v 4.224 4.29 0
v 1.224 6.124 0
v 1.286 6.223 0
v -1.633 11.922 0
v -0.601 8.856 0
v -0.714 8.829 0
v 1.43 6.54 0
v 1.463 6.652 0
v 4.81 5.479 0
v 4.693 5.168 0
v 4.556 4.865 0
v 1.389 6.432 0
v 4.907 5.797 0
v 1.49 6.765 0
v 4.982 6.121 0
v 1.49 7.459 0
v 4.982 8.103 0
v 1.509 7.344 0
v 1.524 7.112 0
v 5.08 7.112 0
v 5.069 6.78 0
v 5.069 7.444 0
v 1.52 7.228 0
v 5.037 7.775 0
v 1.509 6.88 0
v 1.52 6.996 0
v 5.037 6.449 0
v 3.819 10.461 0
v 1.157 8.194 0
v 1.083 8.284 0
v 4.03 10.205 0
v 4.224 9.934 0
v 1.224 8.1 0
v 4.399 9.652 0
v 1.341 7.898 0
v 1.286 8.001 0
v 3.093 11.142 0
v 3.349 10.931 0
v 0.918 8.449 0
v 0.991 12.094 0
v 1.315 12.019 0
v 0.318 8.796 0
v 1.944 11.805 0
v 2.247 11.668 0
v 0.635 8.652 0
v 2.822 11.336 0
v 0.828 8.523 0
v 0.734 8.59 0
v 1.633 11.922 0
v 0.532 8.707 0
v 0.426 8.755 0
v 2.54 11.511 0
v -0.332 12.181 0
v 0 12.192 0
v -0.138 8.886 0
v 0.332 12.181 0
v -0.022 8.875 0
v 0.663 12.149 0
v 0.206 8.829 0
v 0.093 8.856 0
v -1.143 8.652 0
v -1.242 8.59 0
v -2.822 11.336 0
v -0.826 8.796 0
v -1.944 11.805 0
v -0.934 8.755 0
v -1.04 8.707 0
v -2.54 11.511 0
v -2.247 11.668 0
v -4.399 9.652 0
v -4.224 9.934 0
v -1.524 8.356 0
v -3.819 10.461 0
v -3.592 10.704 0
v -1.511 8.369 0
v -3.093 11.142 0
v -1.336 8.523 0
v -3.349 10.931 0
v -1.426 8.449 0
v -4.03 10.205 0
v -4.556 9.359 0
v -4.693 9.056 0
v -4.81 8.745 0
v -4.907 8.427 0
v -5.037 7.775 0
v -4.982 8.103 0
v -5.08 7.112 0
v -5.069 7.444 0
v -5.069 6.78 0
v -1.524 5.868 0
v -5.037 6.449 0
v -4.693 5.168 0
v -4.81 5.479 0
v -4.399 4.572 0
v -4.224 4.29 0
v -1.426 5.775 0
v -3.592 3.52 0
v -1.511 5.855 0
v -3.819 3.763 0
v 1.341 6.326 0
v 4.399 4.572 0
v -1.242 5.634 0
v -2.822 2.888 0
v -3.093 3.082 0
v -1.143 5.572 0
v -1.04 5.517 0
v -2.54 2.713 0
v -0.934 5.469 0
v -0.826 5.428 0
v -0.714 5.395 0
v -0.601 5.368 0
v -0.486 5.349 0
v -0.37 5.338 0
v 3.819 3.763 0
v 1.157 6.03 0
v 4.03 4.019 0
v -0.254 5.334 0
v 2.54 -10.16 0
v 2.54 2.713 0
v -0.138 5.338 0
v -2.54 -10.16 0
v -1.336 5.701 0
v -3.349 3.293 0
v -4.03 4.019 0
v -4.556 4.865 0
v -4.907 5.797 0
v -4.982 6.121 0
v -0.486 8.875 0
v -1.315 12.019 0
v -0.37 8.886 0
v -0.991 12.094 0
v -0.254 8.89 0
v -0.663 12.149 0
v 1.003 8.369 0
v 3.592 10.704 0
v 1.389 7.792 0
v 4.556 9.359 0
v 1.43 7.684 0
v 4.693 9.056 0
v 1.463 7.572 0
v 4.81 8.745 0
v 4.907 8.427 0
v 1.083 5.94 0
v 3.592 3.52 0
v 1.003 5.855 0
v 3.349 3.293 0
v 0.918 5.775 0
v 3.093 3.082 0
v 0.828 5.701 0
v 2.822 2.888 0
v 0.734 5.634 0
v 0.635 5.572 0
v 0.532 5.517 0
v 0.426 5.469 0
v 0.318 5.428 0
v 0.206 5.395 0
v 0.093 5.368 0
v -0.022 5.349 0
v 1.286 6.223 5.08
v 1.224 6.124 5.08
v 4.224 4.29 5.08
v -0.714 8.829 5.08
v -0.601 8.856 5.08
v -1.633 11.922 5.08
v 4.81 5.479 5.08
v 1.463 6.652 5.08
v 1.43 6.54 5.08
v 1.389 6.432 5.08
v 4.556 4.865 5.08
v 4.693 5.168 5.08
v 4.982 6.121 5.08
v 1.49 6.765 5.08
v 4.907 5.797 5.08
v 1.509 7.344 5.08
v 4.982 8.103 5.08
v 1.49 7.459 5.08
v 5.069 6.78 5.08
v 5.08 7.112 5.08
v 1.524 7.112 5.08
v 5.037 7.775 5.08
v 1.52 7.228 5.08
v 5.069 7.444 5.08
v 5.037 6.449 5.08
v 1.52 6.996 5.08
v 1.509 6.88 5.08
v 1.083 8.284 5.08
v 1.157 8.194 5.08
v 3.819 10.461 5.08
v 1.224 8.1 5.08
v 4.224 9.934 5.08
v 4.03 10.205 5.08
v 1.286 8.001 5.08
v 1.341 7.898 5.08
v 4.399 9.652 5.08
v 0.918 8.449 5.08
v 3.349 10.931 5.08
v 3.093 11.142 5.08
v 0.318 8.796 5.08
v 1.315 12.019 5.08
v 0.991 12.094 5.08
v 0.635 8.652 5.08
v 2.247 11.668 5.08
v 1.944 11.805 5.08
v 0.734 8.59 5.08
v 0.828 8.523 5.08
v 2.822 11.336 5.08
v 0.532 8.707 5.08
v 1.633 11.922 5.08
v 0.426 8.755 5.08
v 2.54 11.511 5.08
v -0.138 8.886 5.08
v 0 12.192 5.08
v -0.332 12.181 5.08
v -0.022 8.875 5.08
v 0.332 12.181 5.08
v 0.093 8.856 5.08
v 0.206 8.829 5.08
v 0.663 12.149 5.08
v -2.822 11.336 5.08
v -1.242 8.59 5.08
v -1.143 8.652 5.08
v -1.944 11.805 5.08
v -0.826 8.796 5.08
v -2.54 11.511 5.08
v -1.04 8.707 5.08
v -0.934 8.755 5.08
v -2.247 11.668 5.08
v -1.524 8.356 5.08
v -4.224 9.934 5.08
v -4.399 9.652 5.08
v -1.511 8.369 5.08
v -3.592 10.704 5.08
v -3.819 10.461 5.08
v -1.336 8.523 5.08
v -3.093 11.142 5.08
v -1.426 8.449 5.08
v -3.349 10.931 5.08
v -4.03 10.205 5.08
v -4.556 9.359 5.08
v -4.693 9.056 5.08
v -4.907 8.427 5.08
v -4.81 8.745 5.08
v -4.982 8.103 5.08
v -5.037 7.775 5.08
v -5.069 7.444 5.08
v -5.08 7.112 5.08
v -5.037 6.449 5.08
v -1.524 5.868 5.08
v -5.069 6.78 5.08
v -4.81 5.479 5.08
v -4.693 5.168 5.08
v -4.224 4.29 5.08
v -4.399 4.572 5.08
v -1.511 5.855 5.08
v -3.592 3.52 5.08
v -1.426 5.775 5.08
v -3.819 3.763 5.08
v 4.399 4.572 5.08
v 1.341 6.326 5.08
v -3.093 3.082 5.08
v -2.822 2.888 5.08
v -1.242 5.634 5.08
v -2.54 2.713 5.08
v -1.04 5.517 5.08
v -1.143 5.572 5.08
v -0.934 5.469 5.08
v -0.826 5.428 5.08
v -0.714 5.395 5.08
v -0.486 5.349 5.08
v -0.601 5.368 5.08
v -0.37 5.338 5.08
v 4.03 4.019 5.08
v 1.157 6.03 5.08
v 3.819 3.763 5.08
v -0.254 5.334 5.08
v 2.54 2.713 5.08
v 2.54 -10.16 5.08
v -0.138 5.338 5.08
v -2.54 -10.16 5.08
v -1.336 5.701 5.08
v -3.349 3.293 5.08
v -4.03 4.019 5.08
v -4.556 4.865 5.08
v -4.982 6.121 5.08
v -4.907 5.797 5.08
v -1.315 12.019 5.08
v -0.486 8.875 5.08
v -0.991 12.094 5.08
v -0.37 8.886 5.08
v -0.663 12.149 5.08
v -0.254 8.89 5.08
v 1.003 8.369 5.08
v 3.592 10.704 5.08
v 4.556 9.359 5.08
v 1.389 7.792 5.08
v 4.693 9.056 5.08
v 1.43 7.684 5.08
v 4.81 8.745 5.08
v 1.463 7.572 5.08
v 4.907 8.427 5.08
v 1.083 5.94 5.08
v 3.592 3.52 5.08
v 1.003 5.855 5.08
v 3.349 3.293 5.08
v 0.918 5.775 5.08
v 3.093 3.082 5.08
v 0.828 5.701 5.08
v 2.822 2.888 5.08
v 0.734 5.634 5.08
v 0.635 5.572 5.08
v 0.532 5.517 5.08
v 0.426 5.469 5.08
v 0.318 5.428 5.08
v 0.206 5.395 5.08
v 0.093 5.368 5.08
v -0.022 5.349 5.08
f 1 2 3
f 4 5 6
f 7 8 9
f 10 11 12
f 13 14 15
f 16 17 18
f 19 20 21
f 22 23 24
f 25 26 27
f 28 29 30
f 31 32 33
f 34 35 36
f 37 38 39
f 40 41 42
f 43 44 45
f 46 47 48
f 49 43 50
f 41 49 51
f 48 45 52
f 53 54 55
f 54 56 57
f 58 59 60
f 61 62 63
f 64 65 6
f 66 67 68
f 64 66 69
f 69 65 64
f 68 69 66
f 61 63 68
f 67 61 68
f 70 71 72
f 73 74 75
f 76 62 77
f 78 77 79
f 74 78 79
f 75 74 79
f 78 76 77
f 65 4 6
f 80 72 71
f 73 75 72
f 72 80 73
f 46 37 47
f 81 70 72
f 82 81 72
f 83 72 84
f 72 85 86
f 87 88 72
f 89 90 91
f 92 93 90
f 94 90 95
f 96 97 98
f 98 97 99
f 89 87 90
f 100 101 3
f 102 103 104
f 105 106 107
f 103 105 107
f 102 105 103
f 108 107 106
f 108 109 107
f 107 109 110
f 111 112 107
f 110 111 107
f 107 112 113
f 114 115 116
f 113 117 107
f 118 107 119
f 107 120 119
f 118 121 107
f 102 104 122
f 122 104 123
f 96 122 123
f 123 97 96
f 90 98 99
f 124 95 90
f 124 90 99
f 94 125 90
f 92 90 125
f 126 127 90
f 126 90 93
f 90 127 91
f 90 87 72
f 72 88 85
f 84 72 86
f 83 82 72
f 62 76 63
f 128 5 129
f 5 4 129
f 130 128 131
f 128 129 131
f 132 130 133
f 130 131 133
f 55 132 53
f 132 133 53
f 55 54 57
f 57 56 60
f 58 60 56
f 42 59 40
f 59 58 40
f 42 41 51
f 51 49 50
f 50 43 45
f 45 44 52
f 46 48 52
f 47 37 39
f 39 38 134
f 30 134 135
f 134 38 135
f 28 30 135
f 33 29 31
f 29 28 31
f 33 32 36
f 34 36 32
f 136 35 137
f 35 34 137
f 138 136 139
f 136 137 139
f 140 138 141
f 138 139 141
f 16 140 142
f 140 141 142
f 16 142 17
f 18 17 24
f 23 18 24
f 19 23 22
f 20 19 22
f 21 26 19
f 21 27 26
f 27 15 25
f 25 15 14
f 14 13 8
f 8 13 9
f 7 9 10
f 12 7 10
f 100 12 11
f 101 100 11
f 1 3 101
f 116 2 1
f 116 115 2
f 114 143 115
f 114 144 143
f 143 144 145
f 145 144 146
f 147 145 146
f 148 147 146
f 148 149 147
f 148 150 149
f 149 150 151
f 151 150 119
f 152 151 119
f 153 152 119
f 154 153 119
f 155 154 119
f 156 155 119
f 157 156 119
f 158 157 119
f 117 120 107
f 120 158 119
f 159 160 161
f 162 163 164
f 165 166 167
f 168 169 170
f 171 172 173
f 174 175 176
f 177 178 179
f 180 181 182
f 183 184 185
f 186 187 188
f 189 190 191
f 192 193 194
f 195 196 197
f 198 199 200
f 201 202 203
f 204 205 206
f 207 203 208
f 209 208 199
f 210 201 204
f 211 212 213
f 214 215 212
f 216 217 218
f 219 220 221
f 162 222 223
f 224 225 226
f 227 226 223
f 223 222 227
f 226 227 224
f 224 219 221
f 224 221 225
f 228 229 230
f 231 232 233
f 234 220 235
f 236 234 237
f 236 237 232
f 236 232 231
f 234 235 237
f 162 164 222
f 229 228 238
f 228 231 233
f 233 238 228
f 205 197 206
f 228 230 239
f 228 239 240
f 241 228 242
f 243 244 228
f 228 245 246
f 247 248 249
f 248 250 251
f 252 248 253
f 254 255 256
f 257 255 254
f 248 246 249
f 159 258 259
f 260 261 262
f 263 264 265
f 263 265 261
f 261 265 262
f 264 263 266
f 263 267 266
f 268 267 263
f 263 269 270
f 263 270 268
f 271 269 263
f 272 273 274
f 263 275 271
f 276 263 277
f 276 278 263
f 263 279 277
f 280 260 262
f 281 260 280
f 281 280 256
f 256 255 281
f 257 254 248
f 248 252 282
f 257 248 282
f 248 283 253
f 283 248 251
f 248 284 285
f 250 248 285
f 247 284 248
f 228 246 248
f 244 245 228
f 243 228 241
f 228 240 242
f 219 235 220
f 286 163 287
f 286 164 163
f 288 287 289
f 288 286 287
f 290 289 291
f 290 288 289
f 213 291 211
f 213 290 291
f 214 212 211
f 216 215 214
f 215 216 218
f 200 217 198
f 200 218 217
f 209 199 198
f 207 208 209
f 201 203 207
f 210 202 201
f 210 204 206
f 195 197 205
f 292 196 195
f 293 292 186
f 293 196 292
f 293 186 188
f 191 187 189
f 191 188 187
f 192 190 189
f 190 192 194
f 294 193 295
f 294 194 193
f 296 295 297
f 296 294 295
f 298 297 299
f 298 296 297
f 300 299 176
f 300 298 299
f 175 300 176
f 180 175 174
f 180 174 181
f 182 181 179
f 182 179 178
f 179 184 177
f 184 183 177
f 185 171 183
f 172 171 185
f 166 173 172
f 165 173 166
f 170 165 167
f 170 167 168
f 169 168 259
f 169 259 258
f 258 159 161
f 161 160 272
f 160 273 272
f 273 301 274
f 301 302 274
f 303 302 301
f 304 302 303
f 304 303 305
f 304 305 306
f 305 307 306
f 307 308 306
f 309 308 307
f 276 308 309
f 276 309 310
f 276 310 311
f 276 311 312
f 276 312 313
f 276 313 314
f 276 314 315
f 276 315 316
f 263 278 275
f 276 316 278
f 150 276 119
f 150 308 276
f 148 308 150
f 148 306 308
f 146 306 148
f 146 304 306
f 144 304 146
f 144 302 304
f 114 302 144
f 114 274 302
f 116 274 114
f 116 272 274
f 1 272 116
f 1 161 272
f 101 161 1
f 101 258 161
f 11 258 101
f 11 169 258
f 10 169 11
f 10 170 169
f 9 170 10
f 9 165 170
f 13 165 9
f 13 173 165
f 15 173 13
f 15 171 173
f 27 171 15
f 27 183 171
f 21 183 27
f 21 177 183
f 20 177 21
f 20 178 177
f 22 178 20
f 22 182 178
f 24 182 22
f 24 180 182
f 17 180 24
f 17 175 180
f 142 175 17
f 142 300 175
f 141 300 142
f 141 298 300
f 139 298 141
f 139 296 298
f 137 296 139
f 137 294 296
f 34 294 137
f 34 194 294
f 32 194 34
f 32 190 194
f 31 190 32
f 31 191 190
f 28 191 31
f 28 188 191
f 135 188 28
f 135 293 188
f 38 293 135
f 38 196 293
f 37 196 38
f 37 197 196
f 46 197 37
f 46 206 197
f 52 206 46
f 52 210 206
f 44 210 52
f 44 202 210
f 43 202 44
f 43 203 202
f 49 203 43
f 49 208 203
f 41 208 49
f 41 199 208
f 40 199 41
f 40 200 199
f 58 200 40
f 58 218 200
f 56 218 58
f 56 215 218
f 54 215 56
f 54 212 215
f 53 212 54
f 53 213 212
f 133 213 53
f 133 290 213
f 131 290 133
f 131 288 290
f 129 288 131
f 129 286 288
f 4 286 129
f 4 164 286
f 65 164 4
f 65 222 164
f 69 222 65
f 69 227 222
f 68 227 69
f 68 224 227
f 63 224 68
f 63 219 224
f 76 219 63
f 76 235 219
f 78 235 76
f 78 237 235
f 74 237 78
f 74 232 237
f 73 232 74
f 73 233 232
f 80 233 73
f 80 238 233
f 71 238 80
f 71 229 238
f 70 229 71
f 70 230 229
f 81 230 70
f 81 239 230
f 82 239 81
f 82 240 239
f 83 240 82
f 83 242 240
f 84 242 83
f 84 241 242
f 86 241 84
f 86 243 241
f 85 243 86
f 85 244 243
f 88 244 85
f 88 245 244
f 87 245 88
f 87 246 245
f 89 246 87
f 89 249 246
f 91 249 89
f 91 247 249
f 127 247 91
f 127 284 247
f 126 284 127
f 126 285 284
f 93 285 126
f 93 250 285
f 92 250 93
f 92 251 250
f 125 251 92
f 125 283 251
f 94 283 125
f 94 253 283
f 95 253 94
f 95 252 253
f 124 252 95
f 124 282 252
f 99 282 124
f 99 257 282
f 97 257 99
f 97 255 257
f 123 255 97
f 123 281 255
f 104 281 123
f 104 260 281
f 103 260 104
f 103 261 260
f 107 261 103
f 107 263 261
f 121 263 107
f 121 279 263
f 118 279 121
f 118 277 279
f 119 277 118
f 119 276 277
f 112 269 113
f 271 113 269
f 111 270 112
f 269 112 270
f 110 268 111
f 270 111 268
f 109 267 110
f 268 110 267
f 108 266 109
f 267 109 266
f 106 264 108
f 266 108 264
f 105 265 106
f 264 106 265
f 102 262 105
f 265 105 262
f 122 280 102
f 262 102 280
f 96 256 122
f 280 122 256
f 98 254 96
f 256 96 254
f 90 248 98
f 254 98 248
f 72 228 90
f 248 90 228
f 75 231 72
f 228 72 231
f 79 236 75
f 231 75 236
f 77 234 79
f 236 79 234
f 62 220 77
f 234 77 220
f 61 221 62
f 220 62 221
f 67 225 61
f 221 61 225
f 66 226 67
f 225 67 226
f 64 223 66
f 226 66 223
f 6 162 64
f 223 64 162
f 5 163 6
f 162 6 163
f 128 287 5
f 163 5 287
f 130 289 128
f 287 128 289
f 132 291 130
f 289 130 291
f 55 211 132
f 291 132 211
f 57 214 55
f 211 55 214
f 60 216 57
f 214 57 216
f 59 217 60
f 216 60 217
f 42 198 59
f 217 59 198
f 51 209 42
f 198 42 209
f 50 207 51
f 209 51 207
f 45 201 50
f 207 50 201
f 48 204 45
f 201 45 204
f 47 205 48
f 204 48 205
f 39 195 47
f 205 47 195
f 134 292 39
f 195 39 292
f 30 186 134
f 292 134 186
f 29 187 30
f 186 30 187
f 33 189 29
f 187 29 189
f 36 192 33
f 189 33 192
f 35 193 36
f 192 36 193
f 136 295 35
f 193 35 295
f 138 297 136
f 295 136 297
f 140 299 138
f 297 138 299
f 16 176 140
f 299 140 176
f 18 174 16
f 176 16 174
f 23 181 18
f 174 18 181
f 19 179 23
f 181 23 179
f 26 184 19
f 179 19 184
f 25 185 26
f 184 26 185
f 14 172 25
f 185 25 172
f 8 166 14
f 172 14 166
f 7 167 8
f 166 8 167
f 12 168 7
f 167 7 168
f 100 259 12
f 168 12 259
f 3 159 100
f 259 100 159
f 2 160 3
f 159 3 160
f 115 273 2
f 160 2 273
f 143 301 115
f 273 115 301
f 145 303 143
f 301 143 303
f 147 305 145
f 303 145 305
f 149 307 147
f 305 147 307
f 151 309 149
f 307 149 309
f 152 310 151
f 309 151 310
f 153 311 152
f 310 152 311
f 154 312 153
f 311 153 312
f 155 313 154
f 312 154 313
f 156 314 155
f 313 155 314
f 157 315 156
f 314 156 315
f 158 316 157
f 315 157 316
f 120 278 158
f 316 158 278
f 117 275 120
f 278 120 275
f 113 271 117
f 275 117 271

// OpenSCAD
ViewScale = [0.0254, 0.0254, 0.0254];

scale(ViewScale)
{
    linear_extrude(200)
    difference() {
        union() {
        square([200, 800], center=true);
        translate([0, 280, 0])
        circle(200, $fn=96);
        }
        translate([-10, 280, 0])
        intersection() {
            circle(70, $fn=96);
            translate([20, 0, 0])
            square([140, 200], center=true);
        }
    }
}
